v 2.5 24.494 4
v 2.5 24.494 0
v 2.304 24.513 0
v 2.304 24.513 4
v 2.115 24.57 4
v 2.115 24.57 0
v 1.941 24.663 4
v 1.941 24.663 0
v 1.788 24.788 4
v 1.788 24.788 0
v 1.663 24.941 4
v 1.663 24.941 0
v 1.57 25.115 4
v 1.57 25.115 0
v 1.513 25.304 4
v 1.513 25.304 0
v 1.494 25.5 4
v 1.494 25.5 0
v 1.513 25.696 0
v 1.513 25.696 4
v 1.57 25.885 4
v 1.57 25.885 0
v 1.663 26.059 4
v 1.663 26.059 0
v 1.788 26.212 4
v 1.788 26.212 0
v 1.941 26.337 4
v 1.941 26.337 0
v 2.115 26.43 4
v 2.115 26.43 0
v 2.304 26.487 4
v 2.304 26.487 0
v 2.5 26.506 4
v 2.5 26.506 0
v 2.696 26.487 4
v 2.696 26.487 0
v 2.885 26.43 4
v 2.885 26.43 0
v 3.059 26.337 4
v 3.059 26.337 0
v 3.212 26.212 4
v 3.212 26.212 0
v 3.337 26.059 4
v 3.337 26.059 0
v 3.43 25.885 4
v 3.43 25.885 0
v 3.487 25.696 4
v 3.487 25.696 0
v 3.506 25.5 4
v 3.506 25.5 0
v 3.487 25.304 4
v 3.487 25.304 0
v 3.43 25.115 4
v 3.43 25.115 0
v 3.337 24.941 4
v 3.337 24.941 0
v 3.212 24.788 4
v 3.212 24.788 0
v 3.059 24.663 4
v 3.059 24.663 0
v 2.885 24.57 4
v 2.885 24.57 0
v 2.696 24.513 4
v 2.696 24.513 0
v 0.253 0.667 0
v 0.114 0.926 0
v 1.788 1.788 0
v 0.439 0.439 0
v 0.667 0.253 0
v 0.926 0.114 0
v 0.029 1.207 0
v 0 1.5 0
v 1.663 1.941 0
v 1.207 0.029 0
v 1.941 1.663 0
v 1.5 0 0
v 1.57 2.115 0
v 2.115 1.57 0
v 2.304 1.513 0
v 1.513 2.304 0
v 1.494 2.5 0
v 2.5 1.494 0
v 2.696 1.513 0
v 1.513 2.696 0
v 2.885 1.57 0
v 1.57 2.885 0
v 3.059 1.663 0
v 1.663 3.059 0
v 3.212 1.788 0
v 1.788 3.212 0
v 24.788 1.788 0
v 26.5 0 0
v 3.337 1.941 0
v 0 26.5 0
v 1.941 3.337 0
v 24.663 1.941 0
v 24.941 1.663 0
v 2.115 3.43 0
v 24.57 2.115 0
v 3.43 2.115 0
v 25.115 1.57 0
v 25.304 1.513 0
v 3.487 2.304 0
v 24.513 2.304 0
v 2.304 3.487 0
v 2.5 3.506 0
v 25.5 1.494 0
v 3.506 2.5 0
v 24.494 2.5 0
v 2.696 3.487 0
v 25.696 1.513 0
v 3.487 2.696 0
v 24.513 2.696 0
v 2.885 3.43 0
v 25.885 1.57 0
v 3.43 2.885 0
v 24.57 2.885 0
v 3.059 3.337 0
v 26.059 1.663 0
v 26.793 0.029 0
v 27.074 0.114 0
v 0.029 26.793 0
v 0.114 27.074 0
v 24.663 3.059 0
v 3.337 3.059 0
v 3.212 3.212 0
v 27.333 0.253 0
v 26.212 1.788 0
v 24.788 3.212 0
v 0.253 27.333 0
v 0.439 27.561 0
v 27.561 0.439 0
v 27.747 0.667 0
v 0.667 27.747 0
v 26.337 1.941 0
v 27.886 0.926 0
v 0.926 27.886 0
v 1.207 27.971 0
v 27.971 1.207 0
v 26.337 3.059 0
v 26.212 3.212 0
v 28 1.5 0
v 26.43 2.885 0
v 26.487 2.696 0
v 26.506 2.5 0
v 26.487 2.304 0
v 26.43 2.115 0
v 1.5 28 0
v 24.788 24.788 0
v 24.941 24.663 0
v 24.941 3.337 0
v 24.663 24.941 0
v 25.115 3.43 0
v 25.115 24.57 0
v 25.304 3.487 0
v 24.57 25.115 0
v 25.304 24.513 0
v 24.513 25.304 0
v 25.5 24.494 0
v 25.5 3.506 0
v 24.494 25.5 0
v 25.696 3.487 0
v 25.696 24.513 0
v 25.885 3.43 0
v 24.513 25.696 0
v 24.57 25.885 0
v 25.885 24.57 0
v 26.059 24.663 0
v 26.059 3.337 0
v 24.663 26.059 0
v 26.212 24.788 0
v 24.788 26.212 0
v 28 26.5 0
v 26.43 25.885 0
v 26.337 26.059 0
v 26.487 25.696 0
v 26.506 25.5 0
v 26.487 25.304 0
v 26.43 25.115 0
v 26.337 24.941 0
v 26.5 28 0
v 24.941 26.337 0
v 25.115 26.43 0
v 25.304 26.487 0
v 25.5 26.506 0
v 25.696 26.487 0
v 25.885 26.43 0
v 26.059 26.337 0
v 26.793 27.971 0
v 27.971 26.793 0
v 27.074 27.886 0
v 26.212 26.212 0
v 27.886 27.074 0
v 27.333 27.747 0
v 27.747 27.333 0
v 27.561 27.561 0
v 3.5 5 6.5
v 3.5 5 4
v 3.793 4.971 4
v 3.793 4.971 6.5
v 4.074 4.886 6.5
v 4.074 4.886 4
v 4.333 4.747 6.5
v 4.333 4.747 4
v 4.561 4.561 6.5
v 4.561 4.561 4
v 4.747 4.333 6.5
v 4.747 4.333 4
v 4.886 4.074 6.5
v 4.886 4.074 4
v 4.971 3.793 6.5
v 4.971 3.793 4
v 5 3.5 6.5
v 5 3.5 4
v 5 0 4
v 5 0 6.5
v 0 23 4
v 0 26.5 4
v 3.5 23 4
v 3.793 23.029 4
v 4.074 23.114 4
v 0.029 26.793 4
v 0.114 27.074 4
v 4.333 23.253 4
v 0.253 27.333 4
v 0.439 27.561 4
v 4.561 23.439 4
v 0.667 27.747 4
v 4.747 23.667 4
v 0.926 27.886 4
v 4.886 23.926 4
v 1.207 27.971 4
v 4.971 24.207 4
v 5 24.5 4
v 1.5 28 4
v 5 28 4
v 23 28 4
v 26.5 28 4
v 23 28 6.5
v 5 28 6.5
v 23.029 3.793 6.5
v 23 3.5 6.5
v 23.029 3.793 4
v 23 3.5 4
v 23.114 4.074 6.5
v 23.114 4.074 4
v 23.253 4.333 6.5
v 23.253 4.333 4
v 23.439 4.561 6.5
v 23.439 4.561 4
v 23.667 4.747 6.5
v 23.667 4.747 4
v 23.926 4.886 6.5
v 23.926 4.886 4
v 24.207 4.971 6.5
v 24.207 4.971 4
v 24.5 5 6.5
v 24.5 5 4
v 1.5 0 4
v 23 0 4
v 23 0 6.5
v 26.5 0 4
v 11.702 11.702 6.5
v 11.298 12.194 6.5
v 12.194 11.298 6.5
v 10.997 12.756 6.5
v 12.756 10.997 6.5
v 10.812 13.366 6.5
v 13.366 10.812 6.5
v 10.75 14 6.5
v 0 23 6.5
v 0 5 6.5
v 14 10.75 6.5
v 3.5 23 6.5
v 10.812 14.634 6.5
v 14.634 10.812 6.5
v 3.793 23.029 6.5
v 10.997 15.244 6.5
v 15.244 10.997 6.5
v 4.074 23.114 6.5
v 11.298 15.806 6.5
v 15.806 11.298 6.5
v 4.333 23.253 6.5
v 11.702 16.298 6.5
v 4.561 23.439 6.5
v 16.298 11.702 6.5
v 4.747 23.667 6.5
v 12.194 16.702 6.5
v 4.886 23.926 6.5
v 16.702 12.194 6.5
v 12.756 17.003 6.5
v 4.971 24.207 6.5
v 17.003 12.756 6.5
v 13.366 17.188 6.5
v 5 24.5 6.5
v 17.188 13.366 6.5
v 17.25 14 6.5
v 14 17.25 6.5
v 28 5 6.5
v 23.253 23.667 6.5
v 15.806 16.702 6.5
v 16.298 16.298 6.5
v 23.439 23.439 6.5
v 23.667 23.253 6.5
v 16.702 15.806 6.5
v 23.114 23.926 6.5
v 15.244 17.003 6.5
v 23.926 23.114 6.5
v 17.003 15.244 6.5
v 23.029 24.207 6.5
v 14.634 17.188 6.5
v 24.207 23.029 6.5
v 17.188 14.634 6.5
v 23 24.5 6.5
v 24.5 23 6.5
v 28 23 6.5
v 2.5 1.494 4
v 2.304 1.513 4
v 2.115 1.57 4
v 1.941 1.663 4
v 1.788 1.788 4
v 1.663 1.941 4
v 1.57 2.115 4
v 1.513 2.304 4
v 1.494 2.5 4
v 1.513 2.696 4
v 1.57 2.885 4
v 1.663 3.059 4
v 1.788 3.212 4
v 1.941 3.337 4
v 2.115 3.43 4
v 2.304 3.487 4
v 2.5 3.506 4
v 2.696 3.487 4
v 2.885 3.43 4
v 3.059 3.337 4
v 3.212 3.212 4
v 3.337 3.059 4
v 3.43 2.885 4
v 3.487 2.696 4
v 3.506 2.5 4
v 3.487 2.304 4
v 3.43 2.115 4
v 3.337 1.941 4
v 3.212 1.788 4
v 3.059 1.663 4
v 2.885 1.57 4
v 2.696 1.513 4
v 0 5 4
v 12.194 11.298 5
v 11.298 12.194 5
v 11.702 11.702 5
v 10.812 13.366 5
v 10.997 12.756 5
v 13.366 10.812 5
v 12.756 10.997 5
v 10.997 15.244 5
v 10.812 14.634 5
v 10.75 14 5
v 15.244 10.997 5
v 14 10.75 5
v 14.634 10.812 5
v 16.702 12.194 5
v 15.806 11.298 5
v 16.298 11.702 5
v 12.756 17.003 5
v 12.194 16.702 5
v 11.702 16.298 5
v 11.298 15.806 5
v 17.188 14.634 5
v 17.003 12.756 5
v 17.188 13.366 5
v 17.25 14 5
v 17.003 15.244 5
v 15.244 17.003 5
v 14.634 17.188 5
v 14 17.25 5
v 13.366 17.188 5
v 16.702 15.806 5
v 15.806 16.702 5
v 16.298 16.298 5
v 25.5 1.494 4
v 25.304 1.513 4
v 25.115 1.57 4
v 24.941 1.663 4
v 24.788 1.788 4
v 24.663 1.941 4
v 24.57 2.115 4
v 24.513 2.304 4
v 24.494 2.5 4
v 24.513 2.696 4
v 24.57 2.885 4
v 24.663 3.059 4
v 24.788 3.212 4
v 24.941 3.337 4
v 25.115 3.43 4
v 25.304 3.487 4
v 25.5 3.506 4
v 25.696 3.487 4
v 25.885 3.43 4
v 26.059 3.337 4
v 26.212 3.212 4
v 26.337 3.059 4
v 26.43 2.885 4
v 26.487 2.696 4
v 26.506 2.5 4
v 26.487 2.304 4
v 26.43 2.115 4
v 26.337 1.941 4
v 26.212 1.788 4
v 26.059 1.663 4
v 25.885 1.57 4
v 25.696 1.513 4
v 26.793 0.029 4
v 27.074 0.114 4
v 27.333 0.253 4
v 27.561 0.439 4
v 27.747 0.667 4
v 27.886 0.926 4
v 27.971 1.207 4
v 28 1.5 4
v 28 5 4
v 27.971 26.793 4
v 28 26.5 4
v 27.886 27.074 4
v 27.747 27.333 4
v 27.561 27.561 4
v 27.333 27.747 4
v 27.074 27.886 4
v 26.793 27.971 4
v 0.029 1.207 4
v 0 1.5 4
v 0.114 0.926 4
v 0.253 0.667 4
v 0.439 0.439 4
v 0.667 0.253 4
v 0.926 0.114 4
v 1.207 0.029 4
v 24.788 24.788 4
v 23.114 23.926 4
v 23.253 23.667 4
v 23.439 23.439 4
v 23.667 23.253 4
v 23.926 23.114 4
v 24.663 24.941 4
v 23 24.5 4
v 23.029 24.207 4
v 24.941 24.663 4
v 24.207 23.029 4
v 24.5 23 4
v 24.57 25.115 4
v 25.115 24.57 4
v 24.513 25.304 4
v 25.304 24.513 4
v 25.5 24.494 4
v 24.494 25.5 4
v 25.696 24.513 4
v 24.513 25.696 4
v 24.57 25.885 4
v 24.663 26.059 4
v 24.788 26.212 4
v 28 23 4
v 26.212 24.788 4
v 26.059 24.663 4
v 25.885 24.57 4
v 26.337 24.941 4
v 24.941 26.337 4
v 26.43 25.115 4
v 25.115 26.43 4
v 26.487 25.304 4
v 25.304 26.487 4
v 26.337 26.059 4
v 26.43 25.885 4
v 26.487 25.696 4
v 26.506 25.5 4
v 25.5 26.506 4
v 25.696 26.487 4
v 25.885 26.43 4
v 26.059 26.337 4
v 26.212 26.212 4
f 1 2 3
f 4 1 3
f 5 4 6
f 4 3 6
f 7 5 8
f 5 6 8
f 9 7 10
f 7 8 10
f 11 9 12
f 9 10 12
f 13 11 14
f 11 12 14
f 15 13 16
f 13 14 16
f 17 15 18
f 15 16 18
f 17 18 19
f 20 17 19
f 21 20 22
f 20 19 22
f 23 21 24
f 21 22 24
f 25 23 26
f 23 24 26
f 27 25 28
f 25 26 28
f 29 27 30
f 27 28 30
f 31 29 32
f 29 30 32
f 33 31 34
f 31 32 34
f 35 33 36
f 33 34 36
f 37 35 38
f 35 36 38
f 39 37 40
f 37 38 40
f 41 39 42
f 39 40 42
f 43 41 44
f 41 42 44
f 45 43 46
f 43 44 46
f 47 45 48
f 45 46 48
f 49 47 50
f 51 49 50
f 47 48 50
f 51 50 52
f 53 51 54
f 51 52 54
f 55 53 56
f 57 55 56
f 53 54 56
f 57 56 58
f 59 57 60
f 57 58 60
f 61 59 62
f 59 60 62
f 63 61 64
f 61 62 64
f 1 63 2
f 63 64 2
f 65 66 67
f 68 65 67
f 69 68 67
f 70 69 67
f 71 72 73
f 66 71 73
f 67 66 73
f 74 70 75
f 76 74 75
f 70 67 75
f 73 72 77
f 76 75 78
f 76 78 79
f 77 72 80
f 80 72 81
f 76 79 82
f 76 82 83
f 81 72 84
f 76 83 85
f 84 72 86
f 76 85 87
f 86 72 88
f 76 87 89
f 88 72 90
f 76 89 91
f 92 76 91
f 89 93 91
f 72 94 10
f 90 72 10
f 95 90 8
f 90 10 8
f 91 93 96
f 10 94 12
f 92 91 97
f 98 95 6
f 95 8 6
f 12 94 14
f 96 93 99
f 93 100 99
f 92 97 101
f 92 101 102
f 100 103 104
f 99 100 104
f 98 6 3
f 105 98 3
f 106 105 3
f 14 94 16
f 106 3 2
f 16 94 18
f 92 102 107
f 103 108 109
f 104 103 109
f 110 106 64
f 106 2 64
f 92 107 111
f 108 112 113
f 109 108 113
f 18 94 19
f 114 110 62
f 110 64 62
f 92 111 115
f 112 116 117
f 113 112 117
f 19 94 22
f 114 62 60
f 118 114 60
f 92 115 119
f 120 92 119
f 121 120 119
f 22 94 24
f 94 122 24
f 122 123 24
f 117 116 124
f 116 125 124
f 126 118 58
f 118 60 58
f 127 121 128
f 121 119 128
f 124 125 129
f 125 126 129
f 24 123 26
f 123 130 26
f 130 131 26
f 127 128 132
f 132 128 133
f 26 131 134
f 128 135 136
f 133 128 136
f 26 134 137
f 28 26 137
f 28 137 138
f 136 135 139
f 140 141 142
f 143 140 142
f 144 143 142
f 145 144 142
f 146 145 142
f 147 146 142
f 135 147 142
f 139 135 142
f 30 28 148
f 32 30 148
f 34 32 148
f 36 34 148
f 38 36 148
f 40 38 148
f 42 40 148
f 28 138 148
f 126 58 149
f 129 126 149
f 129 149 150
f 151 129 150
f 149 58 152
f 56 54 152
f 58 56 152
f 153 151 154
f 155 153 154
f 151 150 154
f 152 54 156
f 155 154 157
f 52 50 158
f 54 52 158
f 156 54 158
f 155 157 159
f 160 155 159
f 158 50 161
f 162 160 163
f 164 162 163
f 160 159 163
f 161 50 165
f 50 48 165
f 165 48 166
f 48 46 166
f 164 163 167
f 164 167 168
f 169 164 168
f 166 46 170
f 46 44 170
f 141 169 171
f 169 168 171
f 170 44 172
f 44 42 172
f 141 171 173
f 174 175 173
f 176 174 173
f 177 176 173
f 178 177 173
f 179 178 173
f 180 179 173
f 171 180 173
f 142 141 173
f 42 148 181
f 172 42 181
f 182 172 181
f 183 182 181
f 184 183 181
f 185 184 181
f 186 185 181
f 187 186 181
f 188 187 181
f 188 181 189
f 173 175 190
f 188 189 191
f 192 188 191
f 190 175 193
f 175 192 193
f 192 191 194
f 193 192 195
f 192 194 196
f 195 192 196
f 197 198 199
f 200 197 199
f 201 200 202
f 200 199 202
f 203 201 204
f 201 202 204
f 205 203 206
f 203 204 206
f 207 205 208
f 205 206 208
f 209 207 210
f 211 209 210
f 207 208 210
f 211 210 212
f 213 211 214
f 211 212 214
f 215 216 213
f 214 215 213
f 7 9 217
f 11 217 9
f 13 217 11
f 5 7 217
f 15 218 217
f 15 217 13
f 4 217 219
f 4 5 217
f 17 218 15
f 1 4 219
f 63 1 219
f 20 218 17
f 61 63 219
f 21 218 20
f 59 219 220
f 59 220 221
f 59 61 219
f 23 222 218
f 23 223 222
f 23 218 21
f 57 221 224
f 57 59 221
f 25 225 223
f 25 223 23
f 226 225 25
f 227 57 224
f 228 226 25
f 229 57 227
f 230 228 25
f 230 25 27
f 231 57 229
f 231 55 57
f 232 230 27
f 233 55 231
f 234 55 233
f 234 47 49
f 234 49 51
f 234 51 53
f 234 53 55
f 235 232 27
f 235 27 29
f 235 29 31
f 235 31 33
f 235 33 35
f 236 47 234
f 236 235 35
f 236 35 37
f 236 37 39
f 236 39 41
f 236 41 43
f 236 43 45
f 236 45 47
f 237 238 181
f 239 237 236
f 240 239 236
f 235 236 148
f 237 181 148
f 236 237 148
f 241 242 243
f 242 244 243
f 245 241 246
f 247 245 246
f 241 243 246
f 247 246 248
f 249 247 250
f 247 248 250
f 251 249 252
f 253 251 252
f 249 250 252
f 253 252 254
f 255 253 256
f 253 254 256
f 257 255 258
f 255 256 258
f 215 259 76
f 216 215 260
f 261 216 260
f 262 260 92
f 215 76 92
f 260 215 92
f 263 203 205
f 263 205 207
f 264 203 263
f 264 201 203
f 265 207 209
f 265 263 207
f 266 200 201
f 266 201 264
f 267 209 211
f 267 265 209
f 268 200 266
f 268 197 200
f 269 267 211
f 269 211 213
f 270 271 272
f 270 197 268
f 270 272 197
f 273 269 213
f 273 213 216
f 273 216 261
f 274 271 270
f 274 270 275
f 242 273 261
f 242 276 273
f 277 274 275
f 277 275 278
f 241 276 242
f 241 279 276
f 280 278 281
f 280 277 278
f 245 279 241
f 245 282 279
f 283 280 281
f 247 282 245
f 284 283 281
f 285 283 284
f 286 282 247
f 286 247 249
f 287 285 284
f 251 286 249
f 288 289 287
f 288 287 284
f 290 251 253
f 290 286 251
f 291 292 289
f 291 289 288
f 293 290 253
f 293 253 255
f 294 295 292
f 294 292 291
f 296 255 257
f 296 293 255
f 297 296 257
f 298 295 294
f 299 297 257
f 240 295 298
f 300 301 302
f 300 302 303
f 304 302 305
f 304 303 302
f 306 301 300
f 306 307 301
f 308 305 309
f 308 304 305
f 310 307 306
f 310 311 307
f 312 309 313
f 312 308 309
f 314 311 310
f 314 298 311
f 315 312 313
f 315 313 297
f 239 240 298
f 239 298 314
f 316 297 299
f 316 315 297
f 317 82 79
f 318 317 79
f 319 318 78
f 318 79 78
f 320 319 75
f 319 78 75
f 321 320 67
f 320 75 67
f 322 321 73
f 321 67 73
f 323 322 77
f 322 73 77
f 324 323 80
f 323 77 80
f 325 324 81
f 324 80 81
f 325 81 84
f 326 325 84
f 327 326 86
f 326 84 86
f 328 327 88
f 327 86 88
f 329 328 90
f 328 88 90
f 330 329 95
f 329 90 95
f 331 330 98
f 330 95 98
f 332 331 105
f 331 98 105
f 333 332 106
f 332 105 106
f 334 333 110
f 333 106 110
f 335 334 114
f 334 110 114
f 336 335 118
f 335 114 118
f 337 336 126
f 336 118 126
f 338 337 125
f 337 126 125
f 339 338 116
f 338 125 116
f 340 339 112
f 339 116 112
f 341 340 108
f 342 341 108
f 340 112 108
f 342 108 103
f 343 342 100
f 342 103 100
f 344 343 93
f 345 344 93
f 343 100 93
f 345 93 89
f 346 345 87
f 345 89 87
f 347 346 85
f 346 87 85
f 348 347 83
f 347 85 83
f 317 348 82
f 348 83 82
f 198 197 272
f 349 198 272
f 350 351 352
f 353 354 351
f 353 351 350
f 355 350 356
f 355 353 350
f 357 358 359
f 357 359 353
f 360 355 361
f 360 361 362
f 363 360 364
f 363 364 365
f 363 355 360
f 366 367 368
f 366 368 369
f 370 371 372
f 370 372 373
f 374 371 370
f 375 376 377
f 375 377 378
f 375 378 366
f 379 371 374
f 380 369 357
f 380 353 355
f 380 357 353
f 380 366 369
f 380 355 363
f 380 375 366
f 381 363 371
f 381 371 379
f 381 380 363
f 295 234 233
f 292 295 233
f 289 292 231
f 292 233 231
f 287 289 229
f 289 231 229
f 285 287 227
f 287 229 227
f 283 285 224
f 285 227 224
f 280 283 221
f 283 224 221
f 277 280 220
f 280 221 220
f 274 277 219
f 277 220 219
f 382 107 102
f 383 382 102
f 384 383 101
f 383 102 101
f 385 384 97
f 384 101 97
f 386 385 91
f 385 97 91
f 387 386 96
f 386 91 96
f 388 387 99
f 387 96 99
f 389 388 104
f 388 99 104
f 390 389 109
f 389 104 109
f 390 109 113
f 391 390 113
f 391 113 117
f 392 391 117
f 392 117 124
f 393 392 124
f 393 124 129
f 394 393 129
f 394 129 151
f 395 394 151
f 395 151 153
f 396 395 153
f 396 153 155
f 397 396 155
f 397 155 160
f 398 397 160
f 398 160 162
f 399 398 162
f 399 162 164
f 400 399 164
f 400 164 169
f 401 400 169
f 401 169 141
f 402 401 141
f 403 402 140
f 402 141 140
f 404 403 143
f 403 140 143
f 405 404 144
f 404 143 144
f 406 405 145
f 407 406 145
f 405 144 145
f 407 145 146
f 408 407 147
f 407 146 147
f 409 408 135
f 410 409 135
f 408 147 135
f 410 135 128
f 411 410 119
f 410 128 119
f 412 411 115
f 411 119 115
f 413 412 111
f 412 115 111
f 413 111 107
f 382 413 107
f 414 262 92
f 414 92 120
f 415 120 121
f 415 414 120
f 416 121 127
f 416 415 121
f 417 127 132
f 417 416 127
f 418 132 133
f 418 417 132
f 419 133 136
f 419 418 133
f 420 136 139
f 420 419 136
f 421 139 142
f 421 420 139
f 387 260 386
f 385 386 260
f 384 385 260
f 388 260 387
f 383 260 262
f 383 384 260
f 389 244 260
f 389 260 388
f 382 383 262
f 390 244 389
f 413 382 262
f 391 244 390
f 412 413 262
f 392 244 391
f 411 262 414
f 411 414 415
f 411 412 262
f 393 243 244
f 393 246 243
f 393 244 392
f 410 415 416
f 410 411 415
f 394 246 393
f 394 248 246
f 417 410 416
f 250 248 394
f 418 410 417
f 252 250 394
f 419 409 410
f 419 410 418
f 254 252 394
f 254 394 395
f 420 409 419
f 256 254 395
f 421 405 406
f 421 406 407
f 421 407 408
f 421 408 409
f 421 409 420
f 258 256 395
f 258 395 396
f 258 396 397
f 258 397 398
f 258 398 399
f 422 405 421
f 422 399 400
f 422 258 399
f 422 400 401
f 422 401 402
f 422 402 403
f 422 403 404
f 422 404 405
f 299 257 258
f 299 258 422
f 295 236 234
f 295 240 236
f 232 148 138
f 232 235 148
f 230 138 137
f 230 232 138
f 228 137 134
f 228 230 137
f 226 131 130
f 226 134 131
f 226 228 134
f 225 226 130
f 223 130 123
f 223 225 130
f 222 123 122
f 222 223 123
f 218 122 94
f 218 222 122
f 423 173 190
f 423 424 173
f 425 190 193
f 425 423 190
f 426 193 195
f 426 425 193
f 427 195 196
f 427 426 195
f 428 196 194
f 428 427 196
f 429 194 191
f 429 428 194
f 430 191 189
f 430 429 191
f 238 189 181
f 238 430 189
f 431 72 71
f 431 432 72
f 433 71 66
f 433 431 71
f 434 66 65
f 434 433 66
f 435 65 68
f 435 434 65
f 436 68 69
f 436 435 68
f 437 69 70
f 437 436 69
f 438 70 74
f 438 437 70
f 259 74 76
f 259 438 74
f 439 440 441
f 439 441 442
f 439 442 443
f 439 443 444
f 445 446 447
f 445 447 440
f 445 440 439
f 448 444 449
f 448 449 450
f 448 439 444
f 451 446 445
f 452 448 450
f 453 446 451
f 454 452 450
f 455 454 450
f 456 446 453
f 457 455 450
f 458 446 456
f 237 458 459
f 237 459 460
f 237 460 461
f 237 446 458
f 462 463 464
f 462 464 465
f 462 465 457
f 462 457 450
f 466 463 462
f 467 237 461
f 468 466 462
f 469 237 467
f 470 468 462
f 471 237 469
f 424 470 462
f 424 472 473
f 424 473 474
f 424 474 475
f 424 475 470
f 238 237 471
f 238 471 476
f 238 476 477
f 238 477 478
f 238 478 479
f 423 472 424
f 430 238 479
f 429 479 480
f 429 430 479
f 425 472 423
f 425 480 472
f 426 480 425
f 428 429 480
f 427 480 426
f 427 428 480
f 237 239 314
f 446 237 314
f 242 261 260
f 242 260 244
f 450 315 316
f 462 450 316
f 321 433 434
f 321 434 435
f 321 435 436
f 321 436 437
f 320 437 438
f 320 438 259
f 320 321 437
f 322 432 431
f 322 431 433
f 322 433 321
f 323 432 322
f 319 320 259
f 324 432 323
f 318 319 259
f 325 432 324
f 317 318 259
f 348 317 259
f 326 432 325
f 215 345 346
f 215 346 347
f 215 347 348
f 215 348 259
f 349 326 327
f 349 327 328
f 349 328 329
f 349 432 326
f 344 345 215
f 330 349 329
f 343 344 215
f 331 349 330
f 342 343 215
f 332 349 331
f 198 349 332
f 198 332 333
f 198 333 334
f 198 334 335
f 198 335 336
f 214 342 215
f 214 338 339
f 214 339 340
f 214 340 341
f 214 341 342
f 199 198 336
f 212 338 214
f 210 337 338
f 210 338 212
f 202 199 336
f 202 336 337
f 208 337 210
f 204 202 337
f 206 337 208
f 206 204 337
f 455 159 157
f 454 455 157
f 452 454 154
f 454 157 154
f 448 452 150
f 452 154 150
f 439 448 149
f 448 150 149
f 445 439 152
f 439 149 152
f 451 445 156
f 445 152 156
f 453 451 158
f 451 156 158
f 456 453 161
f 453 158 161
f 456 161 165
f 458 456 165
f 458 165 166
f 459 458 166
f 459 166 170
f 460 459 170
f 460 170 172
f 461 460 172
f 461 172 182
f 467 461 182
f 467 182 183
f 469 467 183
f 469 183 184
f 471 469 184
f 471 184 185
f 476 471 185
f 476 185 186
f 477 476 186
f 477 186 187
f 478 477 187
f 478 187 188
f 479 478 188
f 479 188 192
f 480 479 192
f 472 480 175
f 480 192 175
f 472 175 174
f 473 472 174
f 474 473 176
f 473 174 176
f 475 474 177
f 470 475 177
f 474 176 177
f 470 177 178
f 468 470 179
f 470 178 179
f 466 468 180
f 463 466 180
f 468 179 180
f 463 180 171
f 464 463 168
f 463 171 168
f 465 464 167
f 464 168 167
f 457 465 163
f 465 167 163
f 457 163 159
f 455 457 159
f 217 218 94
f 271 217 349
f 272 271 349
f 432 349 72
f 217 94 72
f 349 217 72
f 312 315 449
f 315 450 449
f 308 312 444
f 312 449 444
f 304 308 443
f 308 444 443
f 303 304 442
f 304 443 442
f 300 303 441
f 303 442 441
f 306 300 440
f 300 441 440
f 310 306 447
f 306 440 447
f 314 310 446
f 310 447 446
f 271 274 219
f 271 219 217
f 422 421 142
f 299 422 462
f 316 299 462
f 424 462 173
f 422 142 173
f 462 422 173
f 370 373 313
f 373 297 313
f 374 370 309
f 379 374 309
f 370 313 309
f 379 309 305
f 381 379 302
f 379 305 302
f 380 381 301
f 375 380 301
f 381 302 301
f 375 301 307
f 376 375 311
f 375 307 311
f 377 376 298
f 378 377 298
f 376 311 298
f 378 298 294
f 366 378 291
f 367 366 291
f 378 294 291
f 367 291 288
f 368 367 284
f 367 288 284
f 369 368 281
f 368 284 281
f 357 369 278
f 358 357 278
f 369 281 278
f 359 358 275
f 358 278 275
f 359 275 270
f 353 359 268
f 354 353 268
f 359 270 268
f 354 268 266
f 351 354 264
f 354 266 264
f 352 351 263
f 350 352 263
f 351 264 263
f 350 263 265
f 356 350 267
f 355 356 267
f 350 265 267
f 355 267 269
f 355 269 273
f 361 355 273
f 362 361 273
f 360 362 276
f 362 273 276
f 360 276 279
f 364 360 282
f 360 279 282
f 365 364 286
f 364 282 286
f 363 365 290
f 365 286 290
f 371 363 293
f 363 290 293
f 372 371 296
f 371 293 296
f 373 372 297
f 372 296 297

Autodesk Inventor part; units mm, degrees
ref_plane "YZ Plane" through (0, 0, 0) normal (1, 0, 0) x (0, 1, 0)
ref_plane "XZ Plane" through (0, 0, 0) normal (0, 1, 0) x (-1, 0, 0)
ref_plane "XY Plane" through (0, 0, 0) normal (0, 0, 1) x (1, 0, 0)
sketch "Sketch1" plane through (0, 0, 0) normal (0, 0, 1) x (1, 0, 0)
  line L0 (0, 0) -> (28, 0)
  line L1 (28, 0) -> (28, 28)
  line L2 (28, 28) -> (0, 28)
  line L3 (0, 28) -> (0, 0)
  dimension "d0" = 28
  dimension "d1" = 28
extrude "Extrusion1" add sketch "Sketch1" along normal blind 6.5
sketch "Sketch6" plane through (0, 0, 6.5) normal (0, 0, 1) x (1, 0, 0)
  line L0 (0, 0) -> (5, 0)
  line L1 (5, 0) -> (5, 5)
  line L2 (5, 5) -> (0, 5)
  line L3 (0, 5) -> (0, 0)
  line L4 (23, 5) -> (28, 5)
  line L5 (28, 5) -> (28, 0)
  line L6 (28, 0) -> (23, 0)
  line L7 (23, 0) -> (23, 5)
  line L8 (0, 28) -> (5, 28)
  line L9 (5, 28) -> (5, 23)
  line L10 (5, 23) -> (0, 23)
  line L11 (0, 23) -> (0, 28)
  line L12 (28, 28) -> (23, 28)
  line L13 (23, 28) -> (23, 23)
  line L14 (23, 23) -> (28, 23)
  line L15 (28, 23) -> (28, 28)
  dimension "d28" = 5
  dimension "d29" = 5
  dimension "d30" = 5
  dimension "d31" = 5
  dimension "d32" = 5
extrude "Extrusion4" cut sketch "Sketch6" against normal blind 2.5
fillet "Fillet2" radius 1.5 8 edges at (0, 0, 2) (5, 5, 5.25) (0, 28, 2) (5, 23, 5.25) (23, 23, 5.25) (28, 28, 2) (23, 5, 5.25) (28, 0, 2)
sketch "Sketch7" plane through (0, 0, 4) normal (0, 0, 1) x (1, 0, 0)
  line L0 (0, 23) -> (0, 26.5) projected
  line L1 (1.5, 28) -> (5, 28) projected
  line L2 (5, 0) -> (1.5, 0) projected
  line L3 (28, 23) -> (28, 5) projected
  line L4 (0, 1.5) -> (0, 5) projected
  line L5 (5, 28) -> (23, 28) projected
  line L6 (23, 0) -> (5, 0) projected
  point P0 (2.5, 25.5)
  point P1 (2.5, 2.5)
  point P2 (25.5, 25.5)
  point P3 (25.5, 2.5)
  dimension "d36" = 2.5
  dimension "d37" = 2.5
  dimension "d38" = 2.5
  dimension "d39" = 2.5
  dimension "d52" = 2.5
  dimension "d53" = 2.5
  dimension "d54" = 2.5
  dimension "d55" = 2.5
hole "Hole2" at (2.5, 25.5, 4) at (2.5, 2.5, 4) at (25.5, 25.5, 4) at (25.5, 2.5, 4) direction (0, 0, -1) diameter 2.013 end through all thread size "M2.5x0.45" class "6H" standard "ANSI Metric M Profile"
sketch "Sketch8" plane through (0, 0, 6.5) normal (0, 0, 1) x (1, 0, 0)
  line L0 (5, 28) -> (23, 28) projected
  line L1 (0, 5) -> (0, 23) projected
  circle A0 centre (14, 14) radius 3.25
  dimension "d47" = 6.5
  dimension "d48" = 14
  dimension "d49" = 14
extrude "Extrusion5" cut sketch "Sketch8" against normal blind 1.5
properties part number "stepper_bottom_28"
